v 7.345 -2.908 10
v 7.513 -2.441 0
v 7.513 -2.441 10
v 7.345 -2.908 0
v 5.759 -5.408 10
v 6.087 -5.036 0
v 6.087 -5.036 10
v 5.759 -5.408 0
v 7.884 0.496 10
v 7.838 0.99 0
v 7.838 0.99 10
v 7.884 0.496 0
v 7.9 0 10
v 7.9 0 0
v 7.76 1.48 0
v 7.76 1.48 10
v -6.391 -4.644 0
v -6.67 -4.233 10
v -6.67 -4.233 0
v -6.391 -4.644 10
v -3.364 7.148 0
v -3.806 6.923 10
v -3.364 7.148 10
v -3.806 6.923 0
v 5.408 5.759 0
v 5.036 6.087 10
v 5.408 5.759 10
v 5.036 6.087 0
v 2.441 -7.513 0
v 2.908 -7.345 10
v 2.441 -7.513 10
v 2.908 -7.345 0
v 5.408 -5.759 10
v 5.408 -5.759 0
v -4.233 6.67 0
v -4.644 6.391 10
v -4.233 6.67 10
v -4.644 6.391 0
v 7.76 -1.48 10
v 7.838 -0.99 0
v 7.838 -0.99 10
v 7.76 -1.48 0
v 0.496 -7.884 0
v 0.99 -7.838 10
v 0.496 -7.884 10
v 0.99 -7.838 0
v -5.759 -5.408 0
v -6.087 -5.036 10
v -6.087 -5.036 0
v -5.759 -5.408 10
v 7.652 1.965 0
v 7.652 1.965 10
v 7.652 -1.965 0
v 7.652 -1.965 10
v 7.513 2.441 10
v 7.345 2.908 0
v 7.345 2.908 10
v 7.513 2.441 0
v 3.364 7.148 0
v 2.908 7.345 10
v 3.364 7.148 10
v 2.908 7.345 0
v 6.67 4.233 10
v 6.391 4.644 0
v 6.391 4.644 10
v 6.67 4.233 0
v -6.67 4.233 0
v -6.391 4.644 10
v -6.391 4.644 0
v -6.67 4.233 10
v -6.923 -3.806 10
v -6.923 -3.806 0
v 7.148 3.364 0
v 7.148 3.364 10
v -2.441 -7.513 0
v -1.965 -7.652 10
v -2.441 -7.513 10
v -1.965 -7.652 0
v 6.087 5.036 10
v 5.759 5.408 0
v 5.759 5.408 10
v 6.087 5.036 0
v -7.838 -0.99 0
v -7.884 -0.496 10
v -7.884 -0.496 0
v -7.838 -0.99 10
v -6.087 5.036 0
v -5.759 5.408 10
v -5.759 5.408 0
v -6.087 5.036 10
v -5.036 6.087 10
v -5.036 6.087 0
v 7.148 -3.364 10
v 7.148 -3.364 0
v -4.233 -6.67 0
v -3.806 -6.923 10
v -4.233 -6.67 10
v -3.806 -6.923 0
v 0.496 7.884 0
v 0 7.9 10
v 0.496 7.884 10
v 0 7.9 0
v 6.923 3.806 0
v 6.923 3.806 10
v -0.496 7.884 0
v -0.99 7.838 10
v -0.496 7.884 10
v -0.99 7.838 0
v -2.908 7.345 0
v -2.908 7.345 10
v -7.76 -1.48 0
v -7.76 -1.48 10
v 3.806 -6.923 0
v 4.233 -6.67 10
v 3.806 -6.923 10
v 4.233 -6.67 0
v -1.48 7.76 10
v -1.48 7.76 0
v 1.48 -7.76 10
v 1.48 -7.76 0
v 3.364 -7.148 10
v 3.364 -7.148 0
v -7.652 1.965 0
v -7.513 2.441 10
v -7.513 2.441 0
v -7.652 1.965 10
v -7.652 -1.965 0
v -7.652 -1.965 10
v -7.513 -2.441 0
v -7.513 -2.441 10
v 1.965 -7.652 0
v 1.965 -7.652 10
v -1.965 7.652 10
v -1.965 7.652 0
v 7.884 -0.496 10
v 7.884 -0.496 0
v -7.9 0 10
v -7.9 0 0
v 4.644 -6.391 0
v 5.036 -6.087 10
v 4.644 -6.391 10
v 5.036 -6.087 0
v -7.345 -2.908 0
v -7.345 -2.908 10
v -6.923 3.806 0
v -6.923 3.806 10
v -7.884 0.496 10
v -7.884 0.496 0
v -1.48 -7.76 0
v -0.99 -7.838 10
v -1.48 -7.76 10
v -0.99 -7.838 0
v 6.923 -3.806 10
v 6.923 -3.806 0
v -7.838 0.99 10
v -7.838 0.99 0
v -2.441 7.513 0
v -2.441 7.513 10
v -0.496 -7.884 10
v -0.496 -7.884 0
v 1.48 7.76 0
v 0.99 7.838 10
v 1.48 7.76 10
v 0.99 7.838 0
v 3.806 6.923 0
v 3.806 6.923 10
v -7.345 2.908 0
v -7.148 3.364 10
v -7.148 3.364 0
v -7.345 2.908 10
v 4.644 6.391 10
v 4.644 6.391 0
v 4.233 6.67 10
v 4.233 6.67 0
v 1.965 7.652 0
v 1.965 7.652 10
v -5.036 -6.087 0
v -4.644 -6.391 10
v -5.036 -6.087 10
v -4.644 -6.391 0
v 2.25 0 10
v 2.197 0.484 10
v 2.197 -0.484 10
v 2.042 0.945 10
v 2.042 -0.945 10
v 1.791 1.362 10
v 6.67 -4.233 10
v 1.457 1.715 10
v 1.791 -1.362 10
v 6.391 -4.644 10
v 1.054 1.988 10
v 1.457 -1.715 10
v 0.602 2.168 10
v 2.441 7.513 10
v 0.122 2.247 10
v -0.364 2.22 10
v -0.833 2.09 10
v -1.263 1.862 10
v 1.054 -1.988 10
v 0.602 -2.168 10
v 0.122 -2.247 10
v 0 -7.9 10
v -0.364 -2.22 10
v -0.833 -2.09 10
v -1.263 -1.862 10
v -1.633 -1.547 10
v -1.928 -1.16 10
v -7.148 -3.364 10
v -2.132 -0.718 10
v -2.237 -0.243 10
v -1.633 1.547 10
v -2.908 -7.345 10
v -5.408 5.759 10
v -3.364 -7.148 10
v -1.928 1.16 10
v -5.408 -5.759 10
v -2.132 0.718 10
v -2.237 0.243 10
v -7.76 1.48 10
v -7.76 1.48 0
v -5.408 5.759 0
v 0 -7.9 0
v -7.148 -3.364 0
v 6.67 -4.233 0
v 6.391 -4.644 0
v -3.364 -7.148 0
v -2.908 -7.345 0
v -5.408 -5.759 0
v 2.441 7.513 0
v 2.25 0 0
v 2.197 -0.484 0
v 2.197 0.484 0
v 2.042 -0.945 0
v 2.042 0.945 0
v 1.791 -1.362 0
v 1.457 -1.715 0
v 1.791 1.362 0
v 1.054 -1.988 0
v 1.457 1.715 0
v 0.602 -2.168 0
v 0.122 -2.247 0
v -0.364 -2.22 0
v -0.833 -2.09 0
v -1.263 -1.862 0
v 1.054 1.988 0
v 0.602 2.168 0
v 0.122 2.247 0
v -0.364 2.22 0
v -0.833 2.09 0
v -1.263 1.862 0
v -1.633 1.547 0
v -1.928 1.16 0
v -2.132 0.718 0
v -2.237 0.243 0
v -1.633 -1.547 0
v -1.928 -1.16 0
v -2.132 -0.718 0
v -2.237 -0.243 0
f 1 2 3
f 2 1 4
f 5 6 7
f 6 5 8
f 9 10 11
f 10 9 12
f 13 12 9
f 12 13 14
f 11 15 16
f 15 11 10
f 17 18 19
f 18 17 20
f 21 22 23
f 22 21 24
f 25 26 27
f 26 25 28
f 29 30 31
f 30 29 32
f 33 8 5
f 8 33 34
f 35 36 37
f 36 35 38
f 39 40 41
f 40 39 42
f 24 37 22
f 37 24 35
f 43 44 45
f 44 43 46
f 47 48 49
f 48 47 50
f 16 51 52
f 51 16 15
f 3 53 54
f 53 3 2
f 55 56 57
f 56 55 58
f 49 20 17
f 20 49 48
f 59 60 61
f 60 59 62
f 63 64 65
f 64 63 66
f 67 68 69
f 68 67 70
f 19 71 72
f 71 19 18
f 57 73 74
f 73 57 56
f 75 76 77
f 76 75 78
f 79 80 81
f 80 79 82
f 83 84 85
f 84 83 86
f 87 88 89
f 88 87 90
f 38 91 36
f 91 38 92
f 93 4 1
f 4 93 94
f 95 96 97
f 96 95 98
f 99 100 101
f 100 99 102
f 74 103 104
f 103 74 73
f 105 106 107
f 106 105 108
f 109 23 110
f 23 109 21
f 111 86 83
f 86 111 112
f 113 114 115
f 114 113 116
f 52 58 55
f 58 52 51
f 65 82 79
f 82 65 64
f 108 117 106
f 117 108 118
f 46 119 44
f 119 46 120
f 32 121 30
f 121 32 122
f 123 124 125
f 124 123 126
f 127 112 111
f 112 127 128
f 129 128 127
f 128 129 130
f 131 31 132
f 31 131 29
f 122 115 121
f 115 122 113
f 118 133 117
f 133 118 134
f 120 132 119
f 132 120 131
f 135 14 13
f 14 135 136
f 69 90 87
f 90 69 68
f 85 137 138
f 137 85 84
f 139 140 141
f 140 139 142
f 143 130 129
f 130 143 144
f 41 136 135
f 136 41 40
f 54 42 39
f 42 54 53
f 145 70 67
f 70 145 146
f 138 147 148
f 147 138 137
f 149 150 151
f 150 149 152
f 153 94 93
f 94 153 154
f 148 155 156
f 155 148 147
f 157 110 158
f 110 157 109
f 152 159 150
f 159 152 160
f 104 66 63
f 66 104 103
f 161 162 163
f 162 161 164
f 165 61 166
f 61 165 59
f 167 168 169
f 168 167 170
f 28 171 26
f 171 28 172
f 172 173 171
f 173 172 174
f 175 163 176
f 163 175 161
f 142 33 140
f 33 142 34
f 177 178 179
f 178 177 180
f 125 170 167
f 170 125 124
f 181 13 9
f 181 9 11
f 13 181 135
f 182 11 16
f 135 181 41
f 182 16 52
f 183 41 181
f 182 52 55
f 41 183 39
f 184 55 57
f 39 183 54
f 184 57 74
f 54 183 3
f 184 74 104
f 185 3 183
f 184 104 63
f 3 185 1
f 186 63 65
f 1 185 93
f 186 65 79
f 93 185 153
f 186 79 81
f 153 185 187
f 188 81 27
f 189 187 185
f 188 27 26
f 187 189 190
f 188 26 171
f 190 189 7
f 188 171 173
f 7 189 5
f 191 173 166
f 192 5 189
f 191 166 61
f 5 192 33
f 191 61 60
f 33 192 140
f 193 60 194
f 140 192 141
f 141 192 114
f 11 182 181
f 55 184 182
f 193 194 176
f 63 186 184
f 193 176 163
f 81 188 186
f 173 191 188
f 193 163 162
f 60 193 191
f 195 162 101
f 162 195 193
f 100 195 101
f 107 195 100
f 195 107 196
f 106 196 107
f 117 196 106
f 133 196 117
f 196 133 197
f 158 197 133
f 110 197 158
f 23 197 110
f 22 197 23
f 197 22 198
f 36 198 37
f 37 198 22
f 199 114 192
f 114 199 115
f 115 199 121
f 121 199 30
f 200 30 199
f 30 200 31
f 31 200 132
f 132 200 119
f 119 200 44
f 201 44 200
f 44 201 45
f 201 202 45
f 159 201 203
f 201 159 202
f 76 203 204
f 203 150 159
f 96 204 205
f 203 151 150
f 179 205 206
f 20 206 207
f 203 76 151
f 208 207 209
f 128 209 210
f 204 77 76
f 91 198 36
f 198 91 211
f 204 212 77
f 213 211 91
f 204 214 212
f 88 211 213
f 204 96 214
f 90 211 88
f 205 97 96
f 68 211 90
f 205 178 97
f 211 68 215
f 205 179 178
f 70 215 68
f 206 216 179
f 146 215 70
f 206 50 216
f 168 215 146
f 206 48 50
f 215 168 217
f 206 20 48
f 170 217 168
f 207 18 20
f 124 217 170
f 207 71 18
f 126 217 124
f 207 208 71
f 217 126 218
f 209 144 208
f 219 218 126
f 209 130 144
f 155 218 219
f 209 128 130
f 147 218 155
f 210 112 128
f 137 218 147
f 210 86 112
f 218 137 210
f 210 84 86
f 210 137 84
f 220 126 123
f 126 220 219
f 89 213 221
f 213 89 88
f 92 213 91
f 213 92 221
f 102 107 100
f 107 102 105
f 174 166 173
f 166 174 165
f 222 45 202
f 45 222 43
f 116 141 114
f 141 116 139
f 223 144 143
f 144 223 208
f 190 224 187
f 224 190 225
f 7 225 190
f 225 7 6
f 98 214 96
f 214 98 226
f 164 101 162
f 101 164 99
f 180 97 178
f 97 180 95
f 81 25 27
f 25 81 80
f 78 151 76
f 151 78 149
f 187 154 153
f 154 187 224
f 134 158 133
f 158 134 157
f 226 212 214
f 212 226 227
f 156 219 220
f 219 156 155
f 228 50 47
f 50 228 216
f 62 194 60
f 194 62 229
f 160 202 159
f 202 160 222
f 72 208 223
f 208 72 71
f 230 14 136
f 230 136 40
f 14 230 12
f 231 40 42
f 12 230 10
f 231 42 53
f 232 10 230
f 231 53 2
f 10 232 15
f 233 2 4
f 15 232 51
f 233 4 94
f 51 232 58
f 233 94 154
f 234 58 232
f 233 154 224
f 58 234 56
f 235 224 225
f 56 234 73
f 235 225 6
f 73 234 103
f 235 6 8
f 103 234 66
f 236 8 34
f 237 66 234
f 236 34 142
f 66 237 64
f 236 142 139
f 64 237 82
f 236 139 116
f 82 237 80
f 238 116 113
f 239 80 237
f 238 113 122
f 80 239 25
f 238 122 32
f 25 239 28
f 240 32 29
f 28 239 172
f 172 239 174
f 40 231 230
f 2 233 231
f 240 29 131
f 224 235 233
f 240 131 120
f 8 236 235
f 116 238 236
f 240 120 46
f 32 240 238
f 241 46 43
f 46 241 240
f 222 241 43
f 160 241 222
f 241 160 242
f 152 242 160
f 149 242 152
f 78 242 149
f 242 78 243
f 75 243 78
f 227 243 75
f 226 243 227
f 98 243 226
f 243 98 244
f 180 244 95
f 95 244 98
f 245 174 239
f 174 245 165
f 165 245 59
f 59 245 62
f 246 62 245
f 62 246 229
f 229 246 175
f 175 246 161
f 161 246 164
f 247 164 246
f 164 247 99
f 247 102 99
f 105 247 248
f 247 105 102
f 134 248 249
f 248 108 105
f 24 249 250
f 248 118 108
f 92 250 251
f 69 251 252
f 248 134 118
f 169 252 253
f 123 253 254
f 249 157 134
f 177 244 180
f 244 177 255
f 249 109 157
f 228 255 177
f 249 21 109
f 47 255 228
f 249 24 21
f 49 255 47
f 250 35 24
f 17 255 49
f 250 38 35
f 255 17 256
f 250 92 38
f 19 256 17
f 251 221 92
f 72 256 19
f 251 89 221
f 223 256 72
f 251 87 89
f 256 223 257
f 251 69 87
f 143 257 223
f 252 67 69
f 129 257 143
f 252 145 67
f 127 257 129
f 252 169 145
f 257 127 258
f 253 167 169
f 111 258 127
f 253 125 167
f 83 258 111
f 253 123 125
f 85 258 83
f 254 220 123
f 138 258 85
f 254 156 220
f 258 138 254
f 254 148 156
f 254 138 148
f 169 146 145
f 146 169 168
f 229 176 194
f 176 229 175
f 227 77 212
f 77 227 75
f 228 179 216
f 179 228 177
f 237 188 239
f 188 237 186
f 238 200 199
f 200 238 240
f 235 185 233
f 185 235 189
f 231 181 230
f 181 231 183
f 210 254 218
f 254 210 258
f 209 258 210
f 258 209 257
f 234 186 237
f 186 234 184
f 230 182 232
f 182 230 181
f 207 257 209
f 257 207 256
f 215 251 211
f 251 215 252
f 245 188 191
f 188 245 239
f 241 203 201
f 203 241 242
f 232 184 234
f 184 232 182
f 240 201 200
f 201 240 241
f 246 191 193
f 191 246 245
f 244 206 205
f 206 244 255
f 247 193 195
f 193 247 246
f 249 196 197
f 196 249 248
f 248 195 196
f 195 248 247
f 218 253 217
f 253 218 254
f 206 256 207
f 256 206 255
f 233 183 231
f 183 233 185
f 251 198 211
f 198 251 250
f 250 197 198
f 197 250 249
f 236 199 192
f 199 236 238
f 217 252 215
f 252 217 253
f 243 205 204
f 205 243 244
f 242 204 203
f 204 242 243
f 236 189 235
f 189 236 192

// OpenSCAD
// vim:ts=4:sw=4:sts=4:et:ai:si:fdm=marker

// Resolution
$fn = 0;   // fixed number of fragments
$fs = 0.5; // minimum fragment size (linear)
$fa = 3;   // minimum fragment angle (angular)

height=10;
d_inner = 4.5;
d_outer = 15.8;

render(convexity=10) {
    difference() {
        cylinder(d=d_outer, h=height);
        cylinder(d=d_inner, h=height);
    }
}
